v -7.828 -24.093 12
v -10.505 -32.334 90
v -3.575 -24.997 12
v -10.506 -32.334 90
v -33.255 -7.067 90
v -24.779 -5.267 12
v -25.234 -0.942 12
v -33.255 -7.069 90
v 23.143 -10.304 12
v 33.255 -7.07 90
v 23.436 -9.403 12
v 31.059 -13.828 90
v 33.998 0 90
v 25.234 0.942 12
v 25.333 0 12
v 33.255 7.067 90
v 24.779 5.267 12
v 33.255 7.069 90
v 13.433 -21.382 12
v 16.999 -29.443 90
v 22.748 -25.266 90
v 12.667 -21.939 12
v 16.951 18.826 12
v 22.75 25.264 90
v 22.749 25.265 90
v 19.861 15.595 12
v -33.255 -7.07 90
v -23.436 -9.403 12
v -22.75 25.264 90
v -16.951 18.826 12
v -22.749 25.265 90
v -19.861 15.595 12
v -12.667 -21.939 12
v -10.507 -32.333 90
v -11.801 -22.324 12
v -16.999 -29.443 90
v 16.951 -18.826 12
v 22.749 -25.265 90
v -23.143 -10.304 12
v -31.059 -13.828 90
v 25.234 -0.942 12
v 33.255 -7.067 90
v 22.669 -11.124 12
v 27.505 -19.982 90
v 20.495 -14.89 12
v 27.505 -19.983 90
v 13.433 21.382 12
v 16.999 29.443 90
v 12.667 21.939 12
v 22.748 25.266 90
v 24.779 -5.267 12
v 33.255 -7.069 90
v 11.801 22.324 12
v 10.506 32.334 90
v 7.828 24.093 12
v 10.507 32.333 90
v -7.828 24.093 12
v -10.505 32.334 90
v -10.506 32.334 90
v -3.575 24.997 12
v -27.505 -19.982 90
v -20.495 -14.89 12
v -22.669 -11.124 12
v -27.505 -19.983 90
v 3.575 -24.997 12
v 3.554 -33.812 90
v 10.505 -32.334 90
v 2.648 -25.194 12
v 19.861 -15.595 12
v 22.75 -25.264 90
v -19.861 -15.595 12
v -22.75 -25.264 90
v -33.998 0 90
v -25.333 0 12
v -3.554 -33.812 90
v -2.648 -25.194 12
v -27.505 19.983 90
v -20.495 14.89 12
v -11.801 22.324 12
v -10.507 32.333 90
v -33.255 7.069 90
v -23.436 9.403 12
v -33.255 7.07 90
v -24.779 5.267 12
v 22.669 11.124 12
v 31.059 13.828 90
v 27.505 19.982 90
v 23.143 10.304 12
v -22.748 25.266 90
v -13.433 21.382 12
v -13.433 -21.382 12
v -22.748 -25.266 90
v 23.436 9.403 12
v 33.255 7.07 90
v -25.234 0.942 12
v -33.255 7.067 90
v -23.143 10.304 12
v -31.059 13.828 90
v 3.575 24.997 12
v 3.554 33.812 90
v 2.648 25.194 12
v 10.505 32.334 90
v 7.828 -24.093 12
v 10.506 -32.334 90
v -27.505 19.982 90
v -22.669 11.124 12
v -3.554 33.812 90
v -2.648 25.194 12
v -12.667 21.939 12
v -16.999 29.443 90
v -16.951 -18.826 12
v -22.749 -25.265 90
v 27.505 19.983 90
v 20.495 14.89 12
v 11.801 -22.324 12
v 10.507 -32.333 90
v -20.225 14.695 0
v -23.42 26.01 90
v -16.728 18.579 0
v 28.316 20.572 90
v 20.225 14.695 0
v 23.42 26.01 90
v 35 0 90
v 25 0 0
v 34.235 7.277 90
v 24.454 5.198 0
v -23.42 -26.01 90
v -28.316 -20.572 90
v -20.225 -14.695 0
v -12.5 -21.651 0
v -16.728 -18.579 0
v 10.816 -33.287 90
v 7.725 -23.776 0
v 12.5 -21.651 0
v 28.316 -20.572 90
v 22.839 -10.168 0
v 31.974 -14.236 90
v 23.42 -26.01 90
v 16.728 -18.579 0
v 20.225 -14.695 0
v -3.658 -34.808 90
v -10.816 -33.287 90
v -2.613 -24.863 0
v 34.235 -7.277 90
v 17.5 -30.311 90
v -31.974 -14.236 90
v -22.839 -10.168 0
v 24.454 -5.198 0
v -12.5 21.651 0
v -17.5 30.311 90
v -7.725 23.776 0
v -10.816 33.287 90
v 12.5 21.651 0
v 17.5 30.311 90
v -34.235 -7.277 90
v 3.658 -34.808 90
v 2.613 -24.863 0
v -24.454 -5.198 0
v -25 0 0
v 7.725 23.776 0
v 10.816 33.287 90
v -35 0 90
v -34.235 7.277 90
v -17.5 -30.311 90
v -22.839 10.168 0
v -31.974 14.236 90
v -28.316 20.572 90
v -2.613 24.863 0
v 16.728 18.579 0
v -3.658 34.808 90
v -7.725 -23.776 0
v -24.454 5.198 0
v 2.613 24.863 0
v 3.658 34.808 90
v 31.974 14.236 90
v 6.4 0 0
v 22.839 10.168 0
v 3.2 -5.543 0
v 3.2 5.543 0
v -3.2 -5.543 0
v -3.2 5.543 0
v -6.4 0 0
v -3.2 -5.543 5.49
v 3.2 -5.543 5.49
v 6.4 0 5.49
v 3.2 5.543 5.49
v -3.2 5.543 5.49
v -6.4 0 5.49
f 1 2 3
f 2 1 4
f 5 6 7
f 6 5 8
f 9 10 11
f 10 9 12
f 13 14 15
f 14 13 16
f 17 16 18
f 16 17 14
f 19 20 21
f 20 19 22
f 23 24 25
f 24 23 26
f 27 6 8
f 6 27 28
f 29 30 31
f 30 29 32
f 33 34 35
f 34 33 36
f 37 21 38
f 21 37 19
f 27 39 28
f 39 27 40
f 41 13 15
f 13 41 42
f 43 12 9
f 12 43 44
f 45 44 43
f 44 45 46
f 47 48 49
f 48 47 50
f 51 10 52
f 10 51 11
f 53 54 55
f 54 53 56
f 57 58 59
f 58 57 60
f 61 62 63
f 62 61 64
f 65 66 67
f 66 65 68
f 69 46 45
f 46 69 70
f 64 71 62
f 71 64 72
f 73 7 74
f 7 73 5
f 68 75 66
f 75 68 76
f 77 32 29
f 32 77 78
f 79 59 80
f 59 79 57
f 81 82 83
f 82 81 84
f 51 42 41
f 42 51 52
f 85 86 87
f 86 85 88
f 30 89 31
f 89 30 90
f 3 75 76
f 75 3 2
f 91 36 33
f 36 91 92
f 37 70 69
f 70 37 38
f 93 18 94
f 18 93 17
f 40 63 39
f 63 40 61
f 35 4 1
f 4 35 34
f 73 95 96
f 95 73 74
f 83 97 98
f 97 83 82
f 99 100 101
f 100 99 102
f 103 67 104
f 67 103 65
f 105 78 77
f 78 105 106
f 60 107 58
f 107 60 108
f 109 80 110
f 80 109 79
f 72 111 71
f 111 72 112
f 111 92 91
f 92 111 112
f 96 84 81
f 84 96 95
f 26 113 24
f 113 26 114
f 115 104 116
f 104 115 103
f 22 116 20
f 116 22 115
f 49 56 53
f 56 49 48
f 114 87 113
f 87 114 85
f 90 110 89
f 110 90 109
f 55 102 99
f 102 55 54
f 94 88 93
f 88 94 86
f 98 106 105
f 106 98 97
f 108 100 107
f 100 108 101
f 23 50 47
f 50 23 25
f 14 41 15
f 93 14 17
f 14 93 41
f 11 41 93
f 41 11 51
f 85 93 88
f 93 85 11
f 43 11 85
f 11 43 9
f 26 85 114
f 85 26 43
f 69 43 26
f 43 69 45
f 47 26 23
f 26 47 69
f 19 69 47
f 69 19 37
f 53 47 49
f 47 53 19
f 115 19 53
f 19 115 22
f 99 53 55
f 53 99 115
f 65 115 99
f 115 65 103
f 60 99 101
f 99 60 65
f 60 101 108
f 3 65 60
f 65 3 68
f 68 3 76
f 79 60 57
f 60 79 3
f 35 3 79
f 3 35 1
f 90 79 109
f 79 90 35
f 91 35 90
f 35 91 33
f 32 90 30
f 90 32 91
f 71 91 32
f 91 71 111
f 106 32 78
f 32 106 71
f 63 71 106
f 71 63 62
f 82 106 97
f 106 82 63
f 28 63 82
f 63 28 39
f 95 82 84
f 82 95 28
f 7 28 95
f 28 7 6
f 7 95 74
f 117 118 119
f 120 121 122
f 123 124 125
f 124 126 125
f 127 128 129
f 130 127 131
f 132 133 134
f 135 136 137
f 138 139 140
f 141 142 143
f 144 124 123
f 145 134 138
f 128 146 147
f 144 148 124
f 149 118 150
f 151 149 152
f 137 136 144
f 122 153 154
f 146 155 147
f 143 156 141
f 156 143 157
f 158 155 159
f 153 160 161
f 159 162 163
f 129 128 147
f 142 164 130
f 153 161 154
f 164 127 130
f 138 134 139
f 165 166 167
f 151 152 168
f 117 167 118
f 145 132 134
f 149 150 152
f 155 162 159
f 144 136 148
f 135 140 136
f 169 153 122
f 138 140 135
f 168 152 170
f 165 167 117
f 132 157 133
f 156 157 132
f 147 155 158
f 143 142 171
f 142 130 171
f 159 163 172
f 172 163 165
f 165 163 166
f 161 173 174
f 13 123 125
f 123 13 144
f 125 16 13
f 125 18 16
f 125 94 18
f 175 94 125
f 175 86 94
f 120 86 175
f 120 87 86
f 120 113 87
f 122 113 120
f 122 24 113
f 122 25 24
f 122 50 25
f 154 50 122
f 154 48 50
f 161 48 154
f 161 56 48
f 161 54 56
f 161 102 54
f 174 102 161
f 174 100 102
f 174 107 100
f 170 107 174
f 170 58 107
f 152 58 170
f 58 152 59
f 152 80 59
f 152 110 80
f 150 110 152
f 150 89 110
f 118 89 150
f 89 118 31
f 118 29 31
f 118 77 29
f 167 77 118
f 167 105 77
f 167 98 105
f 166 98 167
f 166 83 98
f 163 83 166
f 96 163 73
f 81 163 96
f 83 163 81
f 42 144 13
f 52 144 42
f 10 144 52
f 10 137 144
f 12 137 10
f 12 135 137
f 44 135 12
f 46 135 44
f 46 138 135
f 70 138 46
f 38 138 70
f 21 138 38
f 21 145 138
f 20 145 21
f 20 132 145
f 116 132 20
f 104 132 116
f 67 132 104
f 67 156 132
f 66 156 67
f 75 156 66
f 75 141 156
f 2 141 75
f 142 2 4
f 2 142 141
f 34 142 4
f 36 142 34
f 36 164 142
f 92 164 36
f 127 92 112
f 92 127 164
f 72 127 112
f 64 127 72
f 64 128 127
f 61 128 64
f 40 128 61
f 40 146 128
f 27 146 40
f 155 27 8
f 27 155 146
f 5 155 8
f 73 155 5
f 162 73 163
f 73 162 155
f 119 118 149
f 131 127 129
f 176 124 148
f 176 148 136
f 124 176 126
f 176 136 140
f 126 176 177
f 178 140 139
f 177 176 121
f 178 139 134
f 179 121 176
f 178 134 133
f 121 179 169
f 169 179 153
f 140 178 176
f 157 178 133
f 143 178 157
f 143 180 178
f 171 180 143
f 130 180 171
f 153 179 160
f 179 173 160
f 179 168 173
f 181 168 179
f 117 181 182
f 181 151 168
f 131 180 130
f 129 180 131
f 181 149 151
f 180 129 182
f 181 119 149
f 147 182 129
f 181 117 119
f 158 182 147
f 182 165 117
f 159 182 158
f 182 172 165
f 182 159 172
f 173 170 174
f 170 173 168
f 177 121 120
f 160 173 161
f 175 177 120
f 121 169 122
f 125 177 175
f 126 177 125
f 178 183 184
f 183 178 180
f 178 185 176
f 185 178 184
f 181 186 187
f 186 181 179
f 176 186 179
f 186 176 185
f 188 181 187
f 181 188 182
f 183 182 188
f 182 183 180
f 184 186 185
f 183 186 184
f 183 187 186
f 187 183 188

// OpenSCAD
DELTA=0.01;
D_DOWN=50;
D_UP=70;
TALL=90;

WALL=1;

// Needs extra weight
NEED_WEIGHT = true;

module cup()
{
	difference()
		{
			cylinder(d1=D_DOWN,d2=D_UP,h=TALL);
			difference()
				{
					cylinder(d1=D_DOWN-2*WALL,d2=D_UP-2*WALL,h=TALL+2*DELTA);
					translate([-50,-50,0])cube([100,100,12]);
				}
			if (NEED_WEIGHT)
				{
					translate([0,0,-DELTA]) cylinder(d=12.8,h=5.5, $fn=6);
				}
		}
}

cup();
